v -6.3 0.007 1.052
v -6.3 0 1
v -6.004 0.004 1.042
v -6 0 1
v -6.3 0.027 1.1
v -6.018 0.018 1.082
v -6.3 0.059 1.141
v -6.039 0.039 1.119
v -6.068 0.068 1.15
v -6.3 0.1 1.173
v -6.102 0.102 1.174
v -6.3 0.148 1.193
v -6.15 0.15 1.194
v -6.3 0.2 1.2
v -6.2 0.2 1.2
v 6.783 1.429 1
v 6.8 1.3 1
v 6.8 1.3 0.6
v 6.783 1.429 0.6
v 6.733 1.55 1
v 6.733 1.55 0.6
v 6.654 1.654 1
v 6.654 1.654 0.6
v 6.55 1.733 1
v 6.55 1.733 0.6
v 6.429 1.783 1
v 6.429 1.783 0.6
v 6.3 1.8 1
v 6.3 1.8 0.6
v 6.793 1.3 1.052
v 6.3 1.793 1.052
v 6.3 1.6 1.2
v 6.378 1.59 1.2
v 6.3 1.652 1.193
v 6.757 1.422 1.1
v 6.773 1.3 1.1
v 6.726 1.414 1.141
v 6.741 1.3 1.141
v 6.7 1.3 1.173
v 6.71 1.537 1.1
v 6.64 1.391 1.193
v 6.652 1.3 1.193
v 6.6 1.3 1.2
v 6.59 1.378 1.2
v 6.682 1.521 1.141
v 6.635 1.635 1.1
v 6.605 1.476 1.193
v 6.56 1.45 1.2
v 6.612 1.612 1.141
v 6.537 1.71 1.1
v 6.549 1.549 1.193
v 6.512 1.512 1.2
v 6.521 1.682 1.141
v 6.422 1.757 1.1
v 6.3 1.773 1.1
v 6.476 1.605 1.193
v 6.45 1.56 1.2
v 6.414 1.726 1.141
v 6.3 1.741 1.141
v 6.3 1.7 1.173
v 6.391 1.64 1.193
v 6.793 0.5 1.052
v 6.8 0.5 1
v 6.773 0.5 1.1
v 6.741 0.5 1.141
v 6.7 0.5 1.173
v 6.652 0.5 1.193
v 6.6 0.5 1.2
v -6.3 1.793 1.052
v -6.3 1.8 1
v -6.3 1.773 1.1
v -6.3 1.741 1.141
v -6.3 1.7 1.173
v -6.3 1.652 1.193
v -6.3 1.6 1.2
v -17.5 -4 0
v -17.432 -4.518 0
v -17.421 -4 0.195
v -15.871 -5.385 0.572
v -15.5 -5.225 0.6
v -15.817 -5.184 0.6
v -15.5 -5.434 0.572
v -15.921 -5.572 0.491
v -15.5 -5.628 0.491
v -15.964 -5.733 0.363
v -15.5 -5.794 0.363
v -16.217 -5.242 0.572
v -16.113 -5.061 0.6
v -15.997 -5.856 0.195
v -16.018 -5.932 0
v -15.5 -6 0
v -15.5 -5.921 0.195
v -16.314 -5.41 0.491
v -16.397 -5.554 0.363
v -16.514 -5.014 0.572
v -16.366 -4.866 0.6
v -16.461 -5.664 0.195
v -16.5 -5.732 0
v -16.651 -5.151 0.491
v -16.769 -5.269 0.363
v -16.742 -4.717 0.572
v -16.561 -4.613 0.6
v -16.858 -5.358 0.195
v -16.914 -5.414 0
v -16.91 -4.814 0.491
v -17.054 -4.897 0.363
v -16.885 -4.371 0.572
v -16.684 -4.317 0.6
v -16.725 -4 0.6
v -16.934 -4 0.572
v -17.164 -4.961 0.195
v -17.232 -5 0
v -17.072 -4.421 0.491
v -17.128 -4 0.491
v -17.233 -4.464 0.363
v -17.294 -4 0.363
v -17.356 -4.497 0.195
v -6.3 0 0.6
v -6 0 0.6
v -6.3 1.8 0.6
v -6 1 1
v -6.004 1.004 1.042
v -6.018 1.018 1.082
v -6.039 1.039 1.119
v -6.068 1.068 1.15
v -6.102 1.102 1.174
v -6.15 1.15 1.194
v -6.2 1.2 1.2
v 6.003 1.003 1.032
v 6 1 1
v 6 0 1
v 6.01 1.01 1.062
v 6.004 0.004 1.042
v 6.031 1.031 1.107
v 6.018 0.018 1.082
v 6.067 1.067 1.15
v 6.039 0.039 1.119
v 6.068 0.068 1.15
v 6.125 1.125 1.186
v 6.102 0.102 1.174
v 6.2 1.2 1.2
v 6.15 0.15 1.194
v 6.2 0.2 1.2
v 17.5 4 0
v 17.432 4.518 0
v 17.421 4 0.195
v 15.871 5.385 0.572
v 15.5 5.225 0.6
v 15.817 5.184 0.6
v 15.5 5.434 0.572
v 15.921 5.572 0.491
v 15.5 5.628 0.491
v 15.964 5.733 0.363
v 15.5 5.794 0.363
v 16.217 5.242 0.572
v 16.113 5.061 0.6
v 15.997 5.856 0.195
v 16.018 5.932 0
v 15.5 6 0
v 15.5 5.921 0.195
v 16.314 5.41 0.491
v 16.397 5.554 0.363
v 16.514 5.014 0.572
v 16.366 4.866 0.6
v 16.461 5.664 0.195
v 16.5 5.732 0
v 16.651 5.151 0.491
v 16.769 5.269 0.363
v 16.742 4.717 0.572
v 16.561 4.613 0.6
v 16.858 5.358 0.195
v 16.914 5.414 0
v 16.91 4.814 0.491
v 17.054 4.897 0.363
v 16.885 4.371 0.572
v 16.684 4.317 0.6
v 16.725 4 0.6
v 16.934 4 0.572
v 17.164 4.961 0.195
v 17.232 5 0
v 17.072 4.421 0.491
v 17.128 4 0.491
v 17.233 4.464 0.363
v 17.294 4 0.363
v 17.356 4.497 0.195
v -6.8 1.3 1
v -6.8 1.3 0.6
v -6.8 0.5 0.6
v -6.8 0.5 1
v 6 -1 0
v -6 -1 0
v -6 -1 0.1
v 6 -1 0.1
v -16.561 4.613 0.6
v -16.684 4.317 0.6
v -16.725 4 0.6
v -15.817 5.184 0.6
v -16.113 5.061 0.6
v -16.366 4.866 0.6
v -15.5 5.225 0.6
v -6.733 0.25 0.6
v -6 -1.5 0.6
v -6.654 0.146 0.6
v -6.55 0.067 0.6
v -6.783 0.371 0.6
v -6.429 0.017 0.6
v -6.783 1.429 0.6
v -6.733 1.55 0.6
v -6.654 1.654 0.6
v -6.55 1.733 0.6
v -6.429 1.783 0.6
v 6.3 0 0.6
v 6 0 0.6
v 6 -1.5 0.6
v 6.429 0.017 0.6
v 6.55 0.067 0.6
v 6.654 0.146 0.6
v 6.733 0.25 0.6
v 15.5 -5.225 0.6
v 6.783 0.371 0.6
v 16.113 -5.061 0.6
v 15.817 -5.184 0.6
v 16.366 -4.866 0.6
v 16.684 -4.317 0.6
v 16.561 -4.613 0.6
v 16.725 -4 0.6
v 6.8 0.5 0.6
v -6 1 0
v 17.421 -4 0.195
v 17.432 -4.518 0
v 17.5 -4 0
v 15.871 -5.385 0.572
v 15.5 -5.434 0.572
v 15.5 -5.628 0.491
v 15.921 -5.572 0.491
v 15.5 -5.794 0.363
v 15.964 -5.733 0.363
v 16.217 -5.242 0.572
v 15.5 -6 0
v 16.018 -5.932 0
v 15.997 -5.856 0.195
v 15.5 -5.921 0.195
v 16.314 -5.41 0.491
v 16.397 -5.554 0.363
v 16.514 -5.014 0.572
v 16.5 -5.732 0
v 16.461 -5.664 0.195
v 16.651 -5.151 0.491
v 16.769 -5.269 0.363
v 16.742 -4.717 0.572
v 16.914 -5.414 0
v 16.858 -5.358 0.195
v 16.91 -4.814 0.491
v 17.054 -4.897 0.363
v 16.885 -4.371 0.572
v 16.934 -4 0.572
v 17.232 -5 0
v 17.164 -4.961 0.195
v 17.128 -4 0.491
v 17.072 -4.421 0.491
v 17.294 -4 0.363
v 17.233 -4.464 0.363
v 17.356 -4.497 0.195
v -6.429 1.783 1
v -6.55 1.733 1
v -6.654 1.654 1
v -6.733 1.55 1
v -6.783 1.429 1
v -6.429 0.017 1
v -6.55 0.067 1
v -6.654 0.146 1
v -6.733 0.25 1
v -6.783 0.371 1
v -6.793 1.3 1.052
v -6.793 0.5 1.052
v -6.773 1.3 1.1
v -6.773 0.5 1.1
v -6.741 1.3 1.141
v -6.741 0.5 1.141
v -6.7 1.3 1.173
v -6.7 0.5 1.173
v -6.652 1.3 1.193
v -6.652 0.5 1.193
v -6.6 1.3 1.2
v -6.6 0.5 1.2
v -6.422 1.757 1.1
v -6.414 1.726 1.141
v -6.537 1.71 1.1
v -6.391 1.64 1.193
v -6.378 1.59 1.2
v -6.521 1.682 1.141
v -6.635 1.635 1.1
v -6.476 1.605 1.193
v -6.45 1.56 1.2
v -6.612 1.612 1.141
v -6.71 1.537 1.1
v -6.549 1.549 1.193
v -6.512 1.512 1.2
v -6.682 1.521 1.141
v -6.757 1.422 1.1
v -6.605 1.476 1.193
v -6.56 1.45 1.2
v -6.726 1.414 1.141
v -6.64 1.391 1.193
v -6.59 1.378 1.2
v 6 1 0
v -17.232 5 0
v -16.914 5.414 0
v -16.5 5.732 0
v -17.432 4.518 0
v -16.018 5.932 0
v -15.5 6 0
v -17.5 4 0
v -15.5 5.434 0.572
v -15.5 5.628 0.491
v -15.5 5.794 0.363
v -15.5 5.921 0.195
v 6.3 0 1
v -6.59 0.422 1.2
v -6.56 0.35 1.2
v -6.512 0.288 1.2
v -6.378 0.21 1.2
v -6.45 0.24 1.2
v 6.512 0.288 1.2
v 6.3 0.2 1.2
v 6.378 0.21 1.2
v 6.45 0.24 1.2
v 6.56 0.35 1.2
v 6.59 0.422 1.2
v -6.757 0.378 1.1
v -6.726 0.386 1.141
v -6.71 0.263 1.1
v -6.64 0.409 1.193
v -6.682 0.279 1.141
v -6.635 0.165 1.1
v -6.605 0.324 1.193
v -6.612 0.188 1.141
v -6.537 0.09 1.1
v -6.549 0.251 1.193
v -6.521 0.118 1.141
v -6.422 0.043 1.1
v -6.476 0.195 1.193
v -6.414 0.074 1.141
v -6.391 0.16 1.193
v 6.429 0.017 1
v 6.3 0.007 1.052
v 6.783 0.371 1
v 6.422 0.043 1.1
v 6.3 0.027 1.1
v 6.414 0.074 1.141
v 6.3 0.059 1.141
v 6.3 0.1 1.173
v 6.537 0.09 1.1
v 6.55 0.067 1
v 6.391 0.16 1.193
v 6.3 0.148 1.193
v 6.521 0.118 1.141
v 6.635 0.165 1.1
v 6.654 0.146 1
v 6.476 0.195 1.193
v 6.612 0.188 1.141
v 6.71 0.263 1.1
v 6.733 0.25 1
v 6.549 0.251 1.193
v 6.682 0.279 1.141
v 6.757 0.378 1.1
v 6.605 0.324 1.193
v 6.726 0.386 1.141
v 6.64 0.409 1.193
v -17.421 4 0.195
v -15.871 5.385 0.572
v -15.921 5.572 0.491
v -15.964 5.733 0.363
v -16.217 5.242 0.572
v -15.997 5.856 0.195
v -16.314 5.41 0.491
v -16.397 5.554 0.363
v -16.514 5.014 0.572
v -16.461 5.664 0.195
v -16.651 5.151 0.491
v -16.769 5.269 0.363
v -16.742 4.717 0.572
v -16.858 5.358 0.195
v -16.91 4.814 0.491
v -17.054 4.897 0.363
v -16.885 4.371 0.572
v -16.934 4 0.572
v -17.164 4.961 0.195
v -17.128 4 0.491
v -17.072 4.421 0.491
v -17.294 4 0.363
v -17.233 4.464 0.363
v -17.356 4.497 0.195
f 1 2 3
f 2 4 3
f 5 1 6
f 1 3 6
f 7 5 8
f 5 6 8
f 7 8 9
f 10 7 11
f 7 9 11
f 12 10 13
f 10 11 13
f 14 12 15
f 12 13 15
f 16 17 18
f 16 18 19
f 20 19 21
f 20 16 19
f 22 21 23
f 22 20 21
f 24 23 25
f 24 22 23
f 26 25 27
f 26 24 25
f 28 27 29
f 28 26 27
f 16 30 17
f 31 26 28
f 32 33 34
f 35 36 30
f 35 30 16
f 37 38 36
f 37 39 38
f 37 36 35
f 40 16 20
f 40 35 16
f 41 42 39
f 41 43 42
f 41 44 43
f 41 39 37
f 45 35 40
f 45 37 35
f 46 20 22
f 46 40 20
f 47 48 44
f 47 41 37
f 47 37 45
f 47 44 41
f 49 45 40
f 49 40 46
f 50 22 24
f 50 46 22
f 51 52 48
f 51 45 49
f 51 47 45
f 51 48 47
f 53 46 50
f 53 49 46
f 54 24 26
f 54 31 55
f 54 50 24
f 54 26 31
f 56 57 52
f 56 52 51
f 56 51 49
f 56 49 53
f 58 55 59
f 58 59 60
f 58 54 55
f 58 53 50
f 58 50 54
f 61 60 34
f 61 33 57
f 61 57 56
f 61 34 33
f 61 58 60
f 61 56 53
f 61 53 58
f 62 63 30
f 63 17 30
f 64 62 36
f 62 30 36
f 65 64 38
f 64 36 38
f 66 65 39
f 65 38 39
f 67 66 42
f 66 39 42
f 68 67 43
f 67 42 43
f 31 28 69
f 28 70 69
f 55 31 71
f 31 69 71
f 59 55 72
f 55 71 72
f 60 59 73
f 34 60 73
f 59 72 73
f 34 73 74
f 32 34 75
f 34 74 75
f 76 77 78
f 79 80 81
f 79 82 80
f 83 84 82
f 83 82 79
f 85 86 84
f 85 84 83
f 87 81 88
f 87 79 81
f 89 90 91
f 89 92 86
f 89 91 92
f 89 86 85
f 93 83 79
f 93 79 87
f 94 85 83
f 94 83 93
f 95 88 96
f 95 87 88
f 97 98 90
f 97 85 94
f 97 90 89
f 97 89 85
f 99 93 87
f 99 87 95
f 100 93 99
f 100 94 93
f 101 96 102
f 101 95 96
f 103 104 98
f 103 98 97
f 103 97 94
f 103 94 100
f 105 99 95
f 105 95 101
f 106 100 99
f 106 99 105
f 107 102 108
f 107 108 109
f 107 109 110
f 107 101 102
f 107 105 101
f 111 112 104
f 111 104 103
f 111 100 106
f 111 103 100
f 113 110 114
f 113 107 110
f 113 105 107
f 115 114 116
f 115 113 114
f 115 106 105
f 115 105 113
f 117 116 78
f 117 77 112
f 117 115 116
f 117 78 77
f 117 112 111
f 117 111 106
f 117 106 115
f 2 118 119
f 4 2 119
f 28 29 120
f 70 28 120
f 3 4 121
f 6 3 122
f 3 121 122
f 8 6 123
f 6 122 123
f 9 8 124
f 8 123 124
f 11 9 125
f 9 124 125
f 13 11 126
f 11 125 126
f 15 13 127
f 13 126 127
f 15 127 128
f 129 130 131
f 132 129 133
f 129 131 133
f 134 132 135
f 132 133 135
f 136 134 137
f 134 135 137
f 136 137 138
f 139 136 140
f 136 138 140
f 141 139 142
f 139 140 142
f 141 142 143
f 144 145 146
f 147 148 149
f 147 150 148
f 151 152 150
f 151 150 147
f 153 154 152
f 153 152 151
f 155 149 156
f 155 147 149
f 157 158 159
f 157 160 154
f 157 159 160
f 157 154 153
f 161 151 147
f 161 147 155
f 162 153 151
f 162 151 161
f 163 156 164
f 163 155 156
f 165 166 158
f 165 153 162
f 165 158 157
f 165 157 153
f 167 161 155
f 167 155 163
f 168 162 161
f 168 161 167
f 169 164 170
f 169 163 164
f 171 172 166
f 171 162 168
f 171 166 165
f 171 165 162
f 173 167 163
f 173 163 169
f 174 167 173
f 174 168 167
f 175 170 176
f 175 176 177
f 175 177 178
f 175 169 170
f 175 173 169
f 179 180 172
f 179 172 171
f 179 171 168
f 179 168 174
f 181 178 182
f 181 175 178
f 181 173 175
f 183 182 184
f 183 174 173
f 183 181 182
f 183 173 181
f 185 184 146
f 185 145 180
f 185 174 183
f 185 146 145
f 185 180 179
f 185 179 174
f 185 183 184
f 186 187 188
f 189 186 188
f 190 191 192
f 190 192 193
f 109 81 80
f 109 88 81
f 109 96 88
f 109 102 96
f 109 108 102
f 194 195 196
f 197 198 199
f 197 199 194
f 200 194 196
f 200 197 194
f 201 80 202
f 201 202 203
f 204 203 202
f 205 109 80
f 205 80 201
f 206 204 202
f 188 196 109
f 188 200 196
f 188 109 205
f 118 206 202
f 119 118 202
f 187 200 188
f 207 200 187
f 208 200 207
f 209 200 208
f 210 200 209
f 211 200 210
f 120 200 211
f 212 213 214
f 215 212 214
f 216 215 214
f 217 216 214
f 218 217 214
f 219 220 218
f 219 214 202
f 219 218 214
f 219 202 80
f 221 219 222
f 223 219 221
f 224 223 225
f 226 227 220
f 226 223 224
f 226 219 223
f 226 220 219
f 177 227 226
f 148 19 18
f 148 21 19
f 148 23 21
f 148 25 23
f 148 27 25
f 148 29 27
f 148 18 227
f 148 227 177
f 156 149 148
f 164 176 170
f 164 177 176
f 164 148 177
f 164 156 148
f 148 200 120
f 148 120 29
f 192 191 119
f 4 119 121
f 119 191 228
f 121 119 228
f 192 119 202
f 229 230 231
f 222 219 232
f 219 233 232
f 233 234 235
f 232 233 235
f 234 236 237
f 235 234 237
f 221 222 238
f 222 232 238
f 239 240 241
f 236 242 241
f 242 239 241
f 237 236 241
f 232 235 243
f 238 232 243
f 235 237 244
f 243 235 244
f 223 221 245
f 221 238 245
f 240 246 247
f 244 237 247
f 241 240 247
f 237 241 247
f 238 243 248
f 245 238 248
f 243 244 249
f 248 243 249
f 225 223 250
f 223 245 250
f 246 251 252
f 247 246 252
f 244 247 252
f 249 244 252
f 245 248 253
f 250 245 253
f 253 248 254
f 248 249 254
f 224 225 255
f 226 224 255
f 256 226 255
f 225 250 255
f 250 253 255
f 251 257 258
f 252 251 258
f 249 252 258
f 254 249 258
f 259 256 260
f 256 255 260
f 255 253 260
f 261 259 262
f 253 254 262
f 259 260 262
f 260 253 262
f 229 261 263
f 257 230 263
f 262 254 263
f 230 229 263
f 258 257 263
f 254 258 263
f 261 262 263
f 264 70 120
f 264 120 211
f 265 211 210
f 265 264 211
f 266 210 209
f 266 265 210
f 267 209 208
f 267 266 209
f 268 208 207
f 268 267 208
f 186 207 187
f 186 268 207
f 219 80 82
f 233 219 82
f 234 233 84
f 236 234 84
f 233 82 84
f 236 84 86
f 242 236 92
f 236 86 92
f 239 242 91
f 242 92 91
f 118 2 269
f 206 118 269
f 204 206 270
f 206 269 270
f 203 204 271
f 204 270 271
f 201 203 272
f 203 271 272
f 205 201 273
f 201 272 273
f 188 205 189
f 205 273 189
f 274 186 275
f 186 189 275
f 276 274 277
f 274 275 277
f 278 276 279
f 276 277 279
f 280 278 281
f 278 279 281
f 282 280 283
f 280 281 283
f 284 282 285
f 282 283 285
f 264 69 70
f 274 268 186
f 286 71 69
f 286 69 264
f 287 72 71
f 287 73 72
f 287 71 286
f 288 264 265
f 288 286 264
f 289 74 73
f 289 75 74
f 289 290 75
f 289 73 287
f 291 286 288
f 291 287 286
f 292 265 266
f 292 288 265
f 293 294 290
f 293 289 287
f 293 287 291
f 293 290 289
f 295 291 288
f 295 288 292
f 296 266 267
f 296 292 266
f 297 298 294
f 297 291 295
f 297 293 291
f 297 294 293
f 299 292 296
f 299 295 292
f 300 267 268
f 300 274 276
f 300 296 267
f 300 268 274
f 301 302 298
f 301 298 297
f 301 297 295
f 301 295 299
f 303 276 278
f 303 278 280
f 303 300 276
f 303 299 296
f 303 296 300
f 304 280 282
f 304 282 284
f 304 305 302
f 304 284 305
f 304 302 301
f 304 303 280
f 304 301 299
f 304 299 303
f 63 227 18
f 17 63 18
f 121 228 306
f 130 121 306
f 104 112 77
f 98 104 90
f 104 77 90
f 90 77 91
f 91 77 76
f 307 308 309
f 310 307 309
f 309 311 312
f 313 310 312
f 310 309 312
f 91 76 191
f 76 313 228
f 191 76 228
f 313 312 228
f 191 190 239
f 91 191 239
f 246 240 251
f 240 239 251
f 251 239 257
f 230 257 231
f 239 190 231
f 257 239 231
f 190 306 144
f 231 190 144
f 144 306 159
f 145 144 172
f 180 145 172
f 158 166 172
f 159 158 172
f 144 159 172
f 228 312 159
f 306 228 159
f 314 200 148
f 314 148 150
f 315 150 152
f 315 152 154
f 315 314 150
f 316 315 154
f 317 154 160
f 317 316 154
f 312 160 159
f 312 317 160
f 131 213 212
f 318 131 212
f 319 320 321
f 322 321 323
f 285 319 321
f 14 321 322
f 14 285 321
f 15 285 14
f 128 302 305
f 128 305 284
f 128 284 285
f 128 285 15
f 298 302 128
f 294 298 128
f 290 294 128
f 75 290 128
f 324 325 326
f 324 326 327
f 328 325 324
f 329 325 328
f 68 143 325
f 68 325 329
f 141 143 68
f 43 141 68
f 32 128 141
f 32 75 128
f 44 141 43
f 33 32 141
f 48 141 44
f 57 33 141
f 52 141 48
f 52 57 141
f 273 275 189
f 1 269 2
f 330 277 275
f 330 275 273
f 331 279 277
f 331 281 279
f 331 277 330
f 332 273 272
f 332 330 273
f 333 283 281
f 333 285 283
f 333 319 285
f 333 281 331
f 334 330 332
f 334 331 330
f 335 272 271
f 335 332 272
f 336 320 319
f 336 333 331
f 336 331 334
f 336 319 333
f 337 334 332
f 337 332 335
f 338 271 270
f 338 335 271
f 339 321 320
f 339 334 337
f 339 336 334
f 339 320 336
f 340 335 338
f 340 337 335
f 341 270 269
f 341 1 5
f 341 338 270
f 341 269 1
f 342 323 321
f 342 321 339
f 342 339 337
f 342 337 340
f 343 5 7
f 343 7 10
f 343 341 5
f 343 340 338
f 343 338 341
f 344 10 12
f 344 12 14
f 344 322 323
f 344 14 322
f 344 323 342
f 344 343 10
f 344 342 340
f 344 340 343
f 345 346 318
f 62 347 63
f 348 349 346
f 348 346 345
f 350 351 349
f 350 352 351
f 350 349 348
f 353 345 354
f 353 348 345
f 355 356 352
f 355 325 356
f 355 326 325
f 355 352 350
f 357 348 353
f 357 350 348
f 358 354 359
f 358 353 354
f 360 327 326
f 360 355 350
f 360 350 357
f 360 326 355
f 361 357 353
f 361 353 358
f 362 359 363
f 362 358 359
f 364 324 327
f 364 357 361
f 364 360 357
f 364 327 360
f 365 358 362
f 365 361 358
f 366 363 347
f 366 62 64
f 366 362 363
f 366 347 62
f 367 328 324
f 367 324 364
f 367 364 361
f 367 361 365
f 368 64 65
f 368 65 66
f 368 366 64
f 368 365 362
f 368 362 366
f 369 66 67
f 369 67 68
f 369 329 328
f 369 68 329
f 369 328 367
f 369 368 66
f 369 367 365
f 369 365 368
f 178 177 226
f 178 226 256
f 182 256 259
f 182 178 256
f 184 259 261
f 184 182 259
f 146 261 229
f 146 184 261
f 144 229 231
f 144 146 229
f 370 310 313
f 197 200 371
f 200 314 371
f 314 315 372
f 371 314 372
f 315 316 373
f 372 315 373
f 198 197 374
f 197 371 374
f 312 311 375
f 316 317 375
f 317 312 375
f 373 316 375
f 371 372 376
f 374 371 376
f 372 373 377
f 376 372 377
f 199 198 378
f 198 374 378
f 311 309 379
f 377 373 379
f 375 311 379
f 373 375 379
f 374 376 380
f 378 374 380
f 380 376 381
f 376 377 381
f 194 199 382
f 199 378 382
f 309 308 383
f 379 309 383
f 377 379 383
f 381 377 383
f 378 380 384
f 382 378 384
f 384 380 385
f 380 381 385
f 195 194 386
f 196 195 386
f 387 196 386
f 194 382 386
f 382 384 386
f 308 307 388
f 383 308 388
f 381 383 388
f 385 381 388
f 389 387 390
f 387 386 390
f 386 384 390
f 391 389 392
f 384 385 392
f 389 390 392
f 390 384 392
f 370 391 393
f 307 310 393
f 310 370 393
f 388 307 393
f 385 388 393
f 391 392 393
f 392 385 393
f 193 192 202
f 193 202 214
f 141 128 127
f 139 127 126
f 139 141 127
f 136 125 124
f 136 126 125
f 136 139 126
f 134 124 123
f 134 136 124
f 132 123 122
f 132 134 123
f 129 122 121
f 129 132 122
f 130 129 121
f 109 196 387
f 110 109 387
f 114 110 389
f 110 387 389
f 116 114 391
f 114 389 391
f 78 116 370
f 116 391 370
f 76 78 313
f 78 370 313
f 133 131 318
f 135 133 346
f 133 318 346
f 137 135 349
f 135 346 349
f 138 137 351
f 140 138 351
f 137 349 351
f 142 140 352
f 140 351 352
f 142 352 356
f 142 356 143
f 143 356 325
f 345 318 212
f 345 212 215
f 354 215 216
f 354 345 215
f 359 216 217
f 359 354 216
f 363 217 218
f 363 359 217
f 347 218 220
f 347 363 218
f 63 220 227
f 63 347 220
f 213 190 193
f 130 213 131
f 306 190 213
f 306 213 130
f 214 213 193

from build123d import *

# Parameters (mm, degrees)
F0_W         = 35
F0_H         = 12
F0_W_2       = 12
F0_H_2       = 2
F1_DEPTH     = 0.6
F3_DEPTH     = 0.6
F4_R         = 2
F5_R         = 0.5
F6_SIZE      = 0.5
F7_T1_DEPTH  = 8
F7_T3_DEPTH  = 31
F7_T6_ANGLE  = 90
F7_T8_ANGLE  = 90
F7_T10_ANGLE = 90
F7_T12_ANGLE = 90
F8_R         = 0.2


# Not quite as in the source:
# - a fillet or chamfer that OpenCascade refuses, or shapes differently, is made with other operations: its cross-section is extruded or revolved along the edge and cut away or added


with BuildPart() as f1:
    # F0 (on Top) → F1 (new body)
    with BuildSketch(Plane.XY):
        Rectangle(F0_W, F0_H)
        Rectangle(F0_W_2, F0_H_2, mode=Mode.SUBTRACT)
    extrude(amount=F1_DEPTH)

    # F2 (on face) → F3 (join)
    with BuildSketch(Plane.XY.offset(0.6)):
        Polygon((-6.8, 0), (-6, 0), (-6, 1), (6, 1), (6, 0), (6.8, 0), (6.8, 1.8), (-6.8, 1.8), align=None)
    extrude(amount=F3_DEPTH)

    # F4
    f4_edges = [f1.edges().sort_by_distance(p)[0] for p in [
        (-17.5, -6, 0.3),
        (-17.5, 6, 0.3),
        (17.5, 6, 0.3),
        (17.5, -6, 0.3),
    ]]
    fillet(f4_edges, radius=F4_R)

    # F5
    f5_edges = [f1.edges().sort_by_distance(p)[0] for p in [
        (6.8, 1.8, 0.9),
        (6.8, 0, 0.9),
        (-6.8, 1.8, 0.9),
        (-6.8, 0, 0.9),
    ]]
    fillet(f5_edges, radius=F5_R)

    # F6
    f6_edges = [f1.edges().sort_by_distance(p)[0] for p in [
        (0, -1, 0.6),
    ]]
    chamfer(f6_edges, length=F6_SIZE)

    # F7: fillet of radius 0.8 on 8 edges, made by hand

    # F7_s2 → F7_t1 (cut)
    with BuildSketch(Plane.XZ.offset(-4)):
        with BuildLine():
            ThreePointArc((16.7254033308, 0.6), (17.2153012793, 0.432455532), (17.5, 0))
            Line((17.5, 0), (17.5, 0.6))
            Line((17.5, 0.6), (16.7254033308, 0.6))
        make_face()
        with BuildLine():
            ThreePointArc((-16.7254033308, 0.6), (-17.2153012793, 0.432455532), (-17.5, 0))
            Line((-17.5, 0), (-17.5, 0.6))
            Line((-17.5, 0.6), (-16.7254033308, 0.6))
        make_face()
    extrude(amount=F7_T1_DEPTH, mode=Mode.SUBTRACT)

    # F7_s4 → F7_t3 (cut)
    with BuildSketch(Plane.YZ.offset(-15.5)):
        with BuildLine():
            ThreePointArc((5.2254033308, 0.6), (5.7153012793, 0.432455532), (6, 0))
            Line((6, 0), (6, 0.6))
            Line((6, 0.6), (5.2254033308, 0.6))
        make_face()
        with BuildLine():
            ThreePointArc((-5.2254033308, 0.6), (-5.7153012793, 0.432455532), (-6, 0))
            Line((-6, 0), (-6, 0.6))
            Line((-6, 0.6), (-5.2254033308, 0.6))
        make_face()
    extrude(amount=F7_T3_DEPTH, mode=Mode.SUBTRACT)

    # F7_s5 → F7_t6 (revolve, cut)
    with BuildSketch(Plane.YZ.offset(15.5)):
        with BuildLine():
            ThreePointArc((5.2254033308, 0.6), (5.7153012793, 0.432455532), (6, 0))
            Line((6, 0), (6, 0.6))
            Line((6, 0.6), (5.2254033308, 0.6))
        make_face()
    revolve(axis=Axis((15.5, 4, 0.6), (0, 0, -1)), revolution_arc=F7_T6_ANGLE, mode=Mode.SUBTRACT)

    # F7_s7 → F7_t8 (revolve, cut)
    with BuildSketch(Plane.YZ.offset(15.5)):
        with BuildLine():
            ThreePointArc((-5.2254033308, 0.6), (-5.7153012793, 0.432455532), (-6, 0))
            Line((-6, 0), (-6, 0.6))
            Line((-6, 0.6), (-5.2254033308, 0.6))
        make_face()
    revolve(axis=Axis((15.5, -4, 0.6), (0, 0, 1)), revolution_arc=F7_T8_ANGLE, mode=Mode.SUBTRACT)

    # F7_s9 → F7_t10 (revolve, cut)
    with BuildSketch(Plane.YZ.offset(-15.5)):
        with BuildLine():
            ThreePointArc((-5.2254033308, 0.6), (-5.7153012793, 0.432455532), (-6, 0))
            Line((-6, 0), (-6, 0.6))
            Line((-6, 0.6), (-5.2254033308, 0.6))
        make_face()
    revolve(axis=Axis((-15.5, -4, 0.6), (0, 0, -1)), revolution_arc=F7_T10_ANGLE, mode=Mode.SUBTRACT)

    # F7_s11 → F7_t12 (revolve, cut)
    with BuildSketch(Plane.YZ.offset(-15.5)):
        with BuildLine():
            ThreePointArc((5.2254033308, 0.6), (5.7153012793, 0.432455532), (6, 0))
            Line((6, 0), (6, 0.6))
            Line((6, 0.6), (5.2254033308, 0.6))
        make_face()
    revolve(axis=Axis((-15.5, 4, 0.6), (0, 0, 1)), revolution_arc=F7_T12_ANGLE, mode=Mode.SUBTRACT)

    # F8
    f8_edges = [f1.edges().sort_by_distance(p)[0] for p in [
        (6.15, 0, 1.2),
        (6.653553, 0.146447, 1.2),
        (6.8, 0.9, 1.2),
        (6.653553, 1.653553, 1.2),
        (0, 1.8, 1.2),
        (-6.653553, 1.653553, 1.2),
        (-6.8, 0.9, 1.2),
        (-6.653553, 0.146447, 1.2),
        (-6.15, 0, 1.2),
        (-6, 0.5, 1.2),
        (0, 1, 1.2),
        (6, 0.5, 1.2),
    ]]
    fillet(f8_edges, radius=F8_R)


solid = f1.part
